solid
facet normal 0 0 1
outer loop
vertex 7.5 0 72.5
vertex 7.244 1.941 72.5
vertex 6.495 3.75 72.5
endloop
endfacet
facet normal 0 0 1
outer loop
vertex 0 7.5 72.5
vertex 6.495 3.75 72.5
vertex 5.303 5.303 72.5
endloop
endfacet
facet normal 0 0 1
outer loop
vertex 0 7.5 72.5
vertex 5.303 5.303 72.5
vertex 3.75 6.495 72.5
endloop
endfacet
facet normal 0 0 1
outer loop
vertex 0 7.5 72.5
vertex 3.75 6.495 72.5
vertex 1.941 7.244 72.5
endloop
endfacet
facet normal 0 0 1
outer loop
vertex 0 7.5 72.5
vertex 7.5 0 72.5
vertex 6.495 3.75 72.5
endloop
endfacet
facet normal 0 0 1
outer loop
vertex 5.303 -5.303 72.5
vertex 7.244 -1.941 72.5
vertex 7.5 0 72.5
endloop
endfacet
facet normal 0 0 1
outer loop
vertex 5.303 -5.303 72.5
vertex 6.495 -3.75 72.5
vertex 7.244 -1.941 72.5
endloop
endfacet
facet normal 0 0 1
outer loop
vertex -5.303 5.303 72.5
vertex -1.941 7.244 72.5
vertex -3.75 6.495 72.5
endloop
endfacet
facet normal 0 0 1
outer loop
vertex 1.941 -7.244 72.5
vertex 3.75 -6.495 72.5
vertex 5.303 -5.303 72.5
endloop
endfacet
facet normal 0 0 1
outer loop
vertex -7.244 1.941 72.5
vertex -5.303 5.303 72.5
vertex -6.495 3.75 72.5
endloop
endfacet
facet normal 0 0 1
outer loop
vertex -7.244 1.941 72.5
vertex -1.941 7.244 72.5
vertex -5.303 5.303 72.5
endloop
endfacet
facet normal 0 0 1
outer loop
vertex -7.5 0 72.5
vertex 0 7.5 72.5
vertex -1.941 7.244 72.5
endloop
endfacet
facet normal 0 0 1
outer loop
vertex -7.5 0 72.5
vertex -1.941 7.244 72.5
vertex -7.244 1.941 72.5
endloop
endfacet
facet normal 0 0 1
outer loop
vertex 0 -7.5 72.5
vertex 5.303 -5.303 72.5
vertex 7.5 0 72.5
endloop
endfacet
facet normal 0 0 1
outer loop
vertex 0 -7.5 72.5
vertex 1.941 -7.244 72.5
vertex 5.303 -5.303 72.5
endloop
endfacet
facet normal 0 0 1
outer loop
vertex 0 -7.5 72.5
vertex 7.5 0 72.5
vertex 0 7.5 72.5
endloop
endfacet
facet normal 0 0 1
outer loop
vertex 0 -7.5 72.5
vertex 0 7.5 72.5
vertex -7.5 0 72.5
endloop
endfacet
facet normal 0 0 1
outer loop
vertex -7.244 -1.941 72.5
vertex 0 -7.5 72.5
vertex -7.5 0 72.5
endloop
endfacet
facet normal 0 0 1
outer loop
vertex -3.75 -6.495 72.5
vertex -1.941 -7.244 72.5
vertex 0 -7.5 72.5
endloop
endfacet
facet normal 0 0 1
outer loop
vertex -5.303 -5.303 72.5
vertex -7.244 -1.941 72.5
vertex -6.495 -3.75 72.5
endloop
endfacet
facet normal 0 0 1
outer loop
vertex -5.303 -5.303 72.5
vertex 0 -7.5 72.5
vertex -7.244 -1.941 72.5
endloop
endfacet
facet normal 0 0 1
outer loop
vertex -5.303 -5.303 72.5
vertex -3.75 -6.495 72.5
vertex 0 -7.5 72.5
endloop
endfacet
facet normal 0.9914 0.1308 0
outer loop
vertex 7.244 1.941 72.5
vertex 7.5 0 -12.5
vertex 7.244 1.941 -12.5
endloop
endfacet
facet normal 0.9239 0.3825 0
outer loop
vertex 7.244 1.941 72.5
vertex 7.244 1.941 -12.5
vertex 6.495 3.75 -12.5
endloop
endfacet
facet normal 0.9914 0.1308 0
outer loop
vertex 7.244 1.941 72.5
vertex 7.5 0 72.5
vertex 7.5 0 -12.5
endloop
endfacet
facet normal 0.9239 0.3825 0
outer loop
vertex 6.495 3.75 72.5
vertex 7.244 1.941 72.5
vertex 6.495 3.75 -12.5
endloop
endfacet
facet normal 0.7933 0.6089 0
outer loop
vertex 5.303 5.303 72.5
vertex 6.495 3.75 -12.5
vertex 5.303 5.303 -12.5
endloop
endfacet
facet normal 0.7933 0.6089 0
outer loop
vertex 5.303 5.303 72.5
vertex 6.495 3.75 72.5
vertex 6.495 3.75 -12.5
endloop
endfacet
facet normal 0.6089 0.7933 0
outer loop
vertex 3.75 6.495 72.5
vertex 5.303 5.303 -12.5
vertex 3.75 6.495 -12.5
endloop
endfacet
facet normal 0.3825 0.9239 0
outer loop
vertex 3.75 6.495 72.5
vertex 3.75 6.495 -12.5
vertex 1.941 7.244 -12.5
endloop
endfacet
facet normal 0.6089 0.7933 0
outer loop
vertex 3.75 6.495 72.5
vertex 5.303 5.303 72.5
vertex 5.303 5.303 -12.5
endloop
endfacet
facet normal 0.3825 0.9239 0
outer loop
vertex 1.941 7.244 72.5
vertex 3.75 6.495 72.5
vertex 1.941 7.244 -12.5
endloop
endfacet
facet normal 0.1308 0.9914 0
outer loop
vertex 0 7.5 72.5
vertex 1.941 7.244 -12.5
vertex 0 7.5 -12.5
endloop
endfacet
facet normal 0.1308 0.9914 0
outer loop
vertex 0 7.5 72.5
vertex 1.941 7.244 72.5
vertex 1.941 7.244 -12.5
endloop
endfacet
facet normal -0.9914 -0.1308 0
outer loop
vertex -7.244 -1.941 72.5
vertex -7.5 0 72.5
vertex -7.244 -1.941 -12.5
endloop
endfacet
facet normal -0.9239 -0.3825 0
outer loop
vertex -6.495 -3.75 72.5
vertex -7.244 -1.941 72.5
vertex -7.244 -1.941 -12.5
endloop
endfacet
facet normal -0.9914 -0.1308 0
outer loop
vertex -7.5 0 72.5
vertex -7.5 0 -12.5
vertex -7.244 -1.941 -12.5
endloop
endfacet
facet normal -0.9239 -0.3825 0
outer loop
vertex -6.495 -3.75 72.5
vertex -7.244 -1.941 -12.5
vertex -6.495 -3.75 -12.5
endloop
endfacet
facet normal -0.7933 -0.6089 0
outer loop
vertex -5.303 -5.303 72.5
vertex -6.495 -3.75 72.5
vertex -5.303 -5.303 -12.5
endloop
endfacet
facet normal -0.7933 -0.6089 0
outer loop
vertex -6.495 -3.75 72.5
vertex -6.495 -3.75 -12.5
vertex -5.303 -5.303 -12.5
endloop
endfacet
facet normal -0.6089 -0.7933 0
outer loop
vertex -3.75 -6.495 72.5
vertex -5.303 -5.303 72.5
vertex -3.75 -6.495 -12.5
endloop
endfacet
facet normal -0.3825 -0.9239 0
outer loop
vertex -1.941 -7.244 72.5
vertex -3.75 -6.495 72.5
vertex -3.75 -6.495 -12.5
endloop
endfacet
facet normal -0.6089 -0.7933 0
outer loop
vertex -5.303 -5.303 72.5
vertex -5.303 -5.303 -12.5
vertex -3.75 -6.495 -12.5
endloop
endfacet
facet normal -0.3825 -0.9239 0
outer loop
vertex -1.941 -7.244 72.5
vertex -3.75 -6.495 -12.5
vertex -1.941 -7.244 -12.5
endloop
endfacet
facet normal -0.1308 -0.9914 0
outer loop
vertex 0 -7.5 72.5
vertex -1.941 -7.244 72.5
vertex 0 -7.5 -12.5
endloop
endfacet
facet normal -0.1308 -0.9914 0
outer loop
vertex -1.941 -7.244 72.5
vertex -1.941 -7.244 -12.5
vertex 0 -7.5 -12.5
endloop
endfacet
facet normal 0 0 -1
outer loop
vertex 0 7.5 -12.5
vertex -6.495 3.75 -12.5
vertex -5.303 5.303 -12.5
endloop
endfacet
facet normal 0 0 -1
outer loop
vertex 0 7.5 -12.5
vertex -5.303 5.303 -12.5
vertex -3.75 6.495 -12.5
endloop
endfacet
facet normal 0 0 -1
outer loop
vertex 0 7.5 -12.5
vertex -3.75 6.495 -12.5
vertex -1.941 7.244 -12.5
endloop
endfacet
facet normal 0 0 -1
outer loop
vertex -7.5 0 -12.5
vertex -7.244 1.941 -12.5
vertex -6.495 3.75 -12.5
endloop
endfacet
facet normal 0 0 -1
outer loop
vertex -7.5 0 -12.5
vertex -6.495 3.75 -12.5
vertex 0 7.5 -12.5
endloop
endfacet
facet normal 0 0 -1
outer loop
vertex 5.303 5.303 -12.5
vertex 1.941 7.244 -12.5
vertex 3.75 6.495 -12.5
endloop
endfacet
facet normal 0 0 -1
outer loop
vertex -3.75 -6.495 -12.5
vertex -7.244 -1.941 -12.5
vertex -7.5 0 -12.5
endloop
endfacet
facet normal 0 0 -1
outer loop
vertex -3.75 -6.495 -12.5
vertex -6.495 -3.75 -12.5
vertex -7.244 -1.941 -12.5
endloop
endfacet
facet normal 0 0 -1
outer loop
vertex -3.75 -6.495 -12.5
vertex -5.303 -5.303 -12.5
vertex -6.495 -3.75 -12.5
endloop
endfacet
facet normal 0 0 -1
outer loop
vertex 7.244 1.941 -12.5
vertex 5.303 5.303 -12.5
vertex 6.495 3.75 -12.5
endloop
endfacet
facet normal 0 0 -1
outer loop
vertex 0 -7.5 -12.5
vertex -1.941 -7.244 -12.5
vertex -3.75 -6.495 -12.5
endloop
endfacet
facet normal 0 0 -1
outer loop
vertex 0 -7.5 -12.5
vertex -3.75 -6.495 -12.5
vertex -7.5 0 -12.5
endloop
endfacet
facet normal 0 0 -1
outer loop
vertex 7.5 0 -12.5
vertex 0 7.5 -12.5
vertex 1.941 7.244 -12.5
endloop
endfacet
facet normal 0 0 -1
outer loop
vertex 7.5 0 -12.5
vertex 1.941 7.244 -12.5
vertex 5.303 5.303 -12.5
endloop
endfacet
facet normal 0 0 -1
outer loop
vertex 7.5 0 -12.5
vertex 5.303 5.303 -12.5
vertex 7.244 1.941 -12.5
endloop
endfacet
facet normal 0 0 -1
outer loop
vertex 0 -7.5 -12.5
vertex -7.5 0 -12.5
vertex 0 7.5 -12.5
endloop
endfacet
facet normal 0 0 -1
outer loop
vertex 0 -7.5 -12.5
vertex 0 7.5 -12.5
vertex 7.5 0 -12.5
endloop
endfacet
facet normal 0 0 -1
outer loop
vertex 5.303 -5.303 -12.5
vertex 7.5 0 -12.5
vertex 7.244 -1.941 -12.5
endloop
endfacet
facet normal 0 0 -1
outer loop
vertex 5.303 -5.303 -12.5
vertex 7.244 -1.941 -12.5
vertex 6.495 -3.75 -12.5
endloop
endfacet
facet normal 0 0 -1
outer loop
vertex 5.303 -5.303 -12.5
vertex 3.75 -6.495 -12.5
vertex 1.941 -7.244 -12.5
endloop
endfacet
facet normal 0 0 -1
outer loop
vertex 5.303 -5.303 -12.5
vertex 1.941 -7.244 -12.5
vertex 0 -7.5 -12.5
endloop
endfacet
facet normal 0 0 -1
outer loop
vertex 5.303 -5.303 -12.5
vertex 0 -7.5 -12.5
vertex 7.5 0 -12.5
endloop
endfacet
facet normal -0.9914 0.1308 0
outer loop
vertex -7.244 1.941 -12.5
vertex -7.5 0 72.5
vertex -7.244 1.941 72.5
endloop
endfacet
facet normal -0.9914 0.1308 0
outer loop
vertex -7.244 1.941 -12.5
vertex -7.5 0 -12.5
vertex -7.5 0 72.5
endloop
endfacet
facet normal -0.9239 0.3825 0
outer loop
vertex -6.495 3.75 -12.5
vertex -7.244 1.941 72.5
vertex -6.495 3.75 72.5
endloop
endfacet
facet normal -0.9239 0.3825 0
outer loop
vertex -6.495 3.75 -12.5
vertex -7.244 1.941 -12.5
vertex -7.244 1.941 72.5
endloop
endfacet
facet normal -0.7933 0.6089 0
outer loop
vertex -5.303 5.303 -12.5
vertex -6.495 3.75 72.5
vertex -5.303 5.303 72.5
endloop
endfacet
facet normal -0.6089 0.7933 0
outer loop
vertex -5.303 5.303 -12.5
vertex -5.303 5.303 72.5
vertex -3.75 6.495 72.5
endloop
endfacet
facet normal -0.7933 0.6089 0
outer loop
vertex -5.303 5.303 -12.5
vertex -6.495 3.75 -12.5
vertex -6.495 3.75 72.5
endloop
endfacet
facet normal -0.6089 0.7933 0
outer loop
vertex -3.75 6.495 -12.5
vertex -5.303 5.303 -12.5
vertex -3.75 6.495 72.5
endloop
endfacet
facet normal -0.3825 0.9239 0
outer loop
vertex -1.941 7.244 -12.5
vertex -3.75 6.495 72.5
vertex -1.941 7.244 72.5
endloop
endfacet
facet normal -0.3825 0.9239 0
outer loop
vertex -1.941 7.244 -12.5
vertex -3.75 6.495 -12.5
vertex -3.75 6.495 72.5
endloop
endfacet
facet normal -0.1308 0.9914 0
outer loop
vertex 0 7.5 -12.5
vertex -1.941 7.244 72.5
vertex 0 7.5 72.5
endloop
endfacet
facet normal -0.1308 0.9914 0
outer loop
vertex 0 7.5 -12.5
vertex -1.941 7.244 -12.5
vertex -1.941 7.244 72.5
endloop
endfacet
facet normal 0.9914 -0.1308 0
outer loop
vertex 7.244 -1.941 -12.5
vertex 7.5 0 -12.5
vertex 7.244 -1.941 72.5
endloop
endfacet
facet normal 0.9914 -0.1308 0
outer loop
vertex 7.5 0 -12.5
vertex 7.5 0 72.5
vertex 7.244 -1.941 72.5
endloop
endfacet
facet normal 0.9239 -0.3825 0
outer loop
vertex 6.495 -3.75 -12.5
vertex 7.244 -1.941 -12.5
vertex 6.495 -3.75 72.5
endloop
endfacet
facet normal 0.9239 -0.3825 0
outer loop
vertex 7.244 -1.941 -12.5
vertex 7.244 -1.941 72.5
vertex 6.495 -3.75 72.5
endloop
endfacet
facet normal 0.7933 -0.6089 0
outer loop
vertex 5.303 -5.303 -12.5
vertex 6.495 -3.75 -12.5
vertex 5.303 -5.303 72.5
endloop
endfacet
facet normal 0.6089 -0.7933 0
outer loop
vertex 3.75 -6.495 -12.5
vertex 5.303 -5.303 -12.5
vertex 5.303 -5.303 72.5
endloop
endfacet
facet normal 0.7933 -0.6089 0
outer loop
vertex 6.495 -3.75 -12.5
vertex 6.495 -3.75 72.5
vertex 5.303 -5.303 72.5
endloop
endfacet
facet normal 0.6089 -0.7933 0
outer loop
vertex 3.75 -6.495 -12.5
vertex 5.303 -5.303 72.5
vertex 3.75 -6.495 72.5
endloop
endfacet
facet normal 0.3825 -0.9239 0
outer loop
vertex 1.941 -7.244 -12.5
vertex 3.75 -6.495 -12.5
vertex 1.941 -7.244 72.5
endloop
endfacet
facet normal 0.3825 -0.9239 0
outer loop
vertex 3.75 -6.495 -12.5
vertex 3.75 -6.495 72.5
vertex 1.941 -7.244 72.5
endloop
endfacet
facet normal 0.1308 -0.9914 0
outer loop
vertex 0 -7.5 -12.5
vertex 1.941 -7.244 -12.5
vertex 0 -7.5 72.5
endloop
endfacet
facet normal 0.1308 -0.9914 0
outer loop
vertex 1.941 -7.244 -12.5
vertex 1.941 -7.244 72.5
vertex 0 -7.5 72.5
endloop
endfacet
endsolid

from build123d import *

# Parameters (mm, degrees)
F0_W          = 7.5
F0_H          = 35
F0_H_2        = 25
F1_DEPTH      = 7.5
F1_DEPTH_BACK = 7.5
F2_R          = 7.49999


# Not quite as in the source:
# - a fillet or chamfer is up to 0.001 mm smaller than in the source, because OpenCascade refuses the exact size


with BuildPart() as f1:
    # F0 (on Front) → F1 (new body, two sides)
    with BuildSketch(Plane.XZ) as f1_sk:
        Polygon((7.5, -12.5), (7.5, 12.5), (0, 12.5), (-7.5, 12.5), (-7.5, -12.5), align=None)
        with Locations((3.75, 30)):
            Rectangle(F0_W, F0_H)
        with Locations((-3.75, 60)):
            Rectangle(F0_W, F0_H_2)
        with Locations((3.75, 60)):
            Rectangle(F0_W, F0_H_2)
        with Locations((-3.75, 30)):
            Rectangle(F0_W, F0_H)
    extrude(amount=F1_DEPTH)
    extrude(f1_sk.sketch, amount=-F1_DEPTH_BACK)

    # F2 (radius 7.5 in the source; OpenCascade refuses exactly that, so slightly less here)
    f2_edges = [f1.edges().sort_by_distance(p)[0] for p in [
        (-7.5, -7.5, 30),
        (7.5, -7.5, 30),
        (-7.5, 7.5, 30),
        (7.5, 7.5, 30),
    ]]
    fillet(f2_edges, radius=F2_R)


solid = f1.part
